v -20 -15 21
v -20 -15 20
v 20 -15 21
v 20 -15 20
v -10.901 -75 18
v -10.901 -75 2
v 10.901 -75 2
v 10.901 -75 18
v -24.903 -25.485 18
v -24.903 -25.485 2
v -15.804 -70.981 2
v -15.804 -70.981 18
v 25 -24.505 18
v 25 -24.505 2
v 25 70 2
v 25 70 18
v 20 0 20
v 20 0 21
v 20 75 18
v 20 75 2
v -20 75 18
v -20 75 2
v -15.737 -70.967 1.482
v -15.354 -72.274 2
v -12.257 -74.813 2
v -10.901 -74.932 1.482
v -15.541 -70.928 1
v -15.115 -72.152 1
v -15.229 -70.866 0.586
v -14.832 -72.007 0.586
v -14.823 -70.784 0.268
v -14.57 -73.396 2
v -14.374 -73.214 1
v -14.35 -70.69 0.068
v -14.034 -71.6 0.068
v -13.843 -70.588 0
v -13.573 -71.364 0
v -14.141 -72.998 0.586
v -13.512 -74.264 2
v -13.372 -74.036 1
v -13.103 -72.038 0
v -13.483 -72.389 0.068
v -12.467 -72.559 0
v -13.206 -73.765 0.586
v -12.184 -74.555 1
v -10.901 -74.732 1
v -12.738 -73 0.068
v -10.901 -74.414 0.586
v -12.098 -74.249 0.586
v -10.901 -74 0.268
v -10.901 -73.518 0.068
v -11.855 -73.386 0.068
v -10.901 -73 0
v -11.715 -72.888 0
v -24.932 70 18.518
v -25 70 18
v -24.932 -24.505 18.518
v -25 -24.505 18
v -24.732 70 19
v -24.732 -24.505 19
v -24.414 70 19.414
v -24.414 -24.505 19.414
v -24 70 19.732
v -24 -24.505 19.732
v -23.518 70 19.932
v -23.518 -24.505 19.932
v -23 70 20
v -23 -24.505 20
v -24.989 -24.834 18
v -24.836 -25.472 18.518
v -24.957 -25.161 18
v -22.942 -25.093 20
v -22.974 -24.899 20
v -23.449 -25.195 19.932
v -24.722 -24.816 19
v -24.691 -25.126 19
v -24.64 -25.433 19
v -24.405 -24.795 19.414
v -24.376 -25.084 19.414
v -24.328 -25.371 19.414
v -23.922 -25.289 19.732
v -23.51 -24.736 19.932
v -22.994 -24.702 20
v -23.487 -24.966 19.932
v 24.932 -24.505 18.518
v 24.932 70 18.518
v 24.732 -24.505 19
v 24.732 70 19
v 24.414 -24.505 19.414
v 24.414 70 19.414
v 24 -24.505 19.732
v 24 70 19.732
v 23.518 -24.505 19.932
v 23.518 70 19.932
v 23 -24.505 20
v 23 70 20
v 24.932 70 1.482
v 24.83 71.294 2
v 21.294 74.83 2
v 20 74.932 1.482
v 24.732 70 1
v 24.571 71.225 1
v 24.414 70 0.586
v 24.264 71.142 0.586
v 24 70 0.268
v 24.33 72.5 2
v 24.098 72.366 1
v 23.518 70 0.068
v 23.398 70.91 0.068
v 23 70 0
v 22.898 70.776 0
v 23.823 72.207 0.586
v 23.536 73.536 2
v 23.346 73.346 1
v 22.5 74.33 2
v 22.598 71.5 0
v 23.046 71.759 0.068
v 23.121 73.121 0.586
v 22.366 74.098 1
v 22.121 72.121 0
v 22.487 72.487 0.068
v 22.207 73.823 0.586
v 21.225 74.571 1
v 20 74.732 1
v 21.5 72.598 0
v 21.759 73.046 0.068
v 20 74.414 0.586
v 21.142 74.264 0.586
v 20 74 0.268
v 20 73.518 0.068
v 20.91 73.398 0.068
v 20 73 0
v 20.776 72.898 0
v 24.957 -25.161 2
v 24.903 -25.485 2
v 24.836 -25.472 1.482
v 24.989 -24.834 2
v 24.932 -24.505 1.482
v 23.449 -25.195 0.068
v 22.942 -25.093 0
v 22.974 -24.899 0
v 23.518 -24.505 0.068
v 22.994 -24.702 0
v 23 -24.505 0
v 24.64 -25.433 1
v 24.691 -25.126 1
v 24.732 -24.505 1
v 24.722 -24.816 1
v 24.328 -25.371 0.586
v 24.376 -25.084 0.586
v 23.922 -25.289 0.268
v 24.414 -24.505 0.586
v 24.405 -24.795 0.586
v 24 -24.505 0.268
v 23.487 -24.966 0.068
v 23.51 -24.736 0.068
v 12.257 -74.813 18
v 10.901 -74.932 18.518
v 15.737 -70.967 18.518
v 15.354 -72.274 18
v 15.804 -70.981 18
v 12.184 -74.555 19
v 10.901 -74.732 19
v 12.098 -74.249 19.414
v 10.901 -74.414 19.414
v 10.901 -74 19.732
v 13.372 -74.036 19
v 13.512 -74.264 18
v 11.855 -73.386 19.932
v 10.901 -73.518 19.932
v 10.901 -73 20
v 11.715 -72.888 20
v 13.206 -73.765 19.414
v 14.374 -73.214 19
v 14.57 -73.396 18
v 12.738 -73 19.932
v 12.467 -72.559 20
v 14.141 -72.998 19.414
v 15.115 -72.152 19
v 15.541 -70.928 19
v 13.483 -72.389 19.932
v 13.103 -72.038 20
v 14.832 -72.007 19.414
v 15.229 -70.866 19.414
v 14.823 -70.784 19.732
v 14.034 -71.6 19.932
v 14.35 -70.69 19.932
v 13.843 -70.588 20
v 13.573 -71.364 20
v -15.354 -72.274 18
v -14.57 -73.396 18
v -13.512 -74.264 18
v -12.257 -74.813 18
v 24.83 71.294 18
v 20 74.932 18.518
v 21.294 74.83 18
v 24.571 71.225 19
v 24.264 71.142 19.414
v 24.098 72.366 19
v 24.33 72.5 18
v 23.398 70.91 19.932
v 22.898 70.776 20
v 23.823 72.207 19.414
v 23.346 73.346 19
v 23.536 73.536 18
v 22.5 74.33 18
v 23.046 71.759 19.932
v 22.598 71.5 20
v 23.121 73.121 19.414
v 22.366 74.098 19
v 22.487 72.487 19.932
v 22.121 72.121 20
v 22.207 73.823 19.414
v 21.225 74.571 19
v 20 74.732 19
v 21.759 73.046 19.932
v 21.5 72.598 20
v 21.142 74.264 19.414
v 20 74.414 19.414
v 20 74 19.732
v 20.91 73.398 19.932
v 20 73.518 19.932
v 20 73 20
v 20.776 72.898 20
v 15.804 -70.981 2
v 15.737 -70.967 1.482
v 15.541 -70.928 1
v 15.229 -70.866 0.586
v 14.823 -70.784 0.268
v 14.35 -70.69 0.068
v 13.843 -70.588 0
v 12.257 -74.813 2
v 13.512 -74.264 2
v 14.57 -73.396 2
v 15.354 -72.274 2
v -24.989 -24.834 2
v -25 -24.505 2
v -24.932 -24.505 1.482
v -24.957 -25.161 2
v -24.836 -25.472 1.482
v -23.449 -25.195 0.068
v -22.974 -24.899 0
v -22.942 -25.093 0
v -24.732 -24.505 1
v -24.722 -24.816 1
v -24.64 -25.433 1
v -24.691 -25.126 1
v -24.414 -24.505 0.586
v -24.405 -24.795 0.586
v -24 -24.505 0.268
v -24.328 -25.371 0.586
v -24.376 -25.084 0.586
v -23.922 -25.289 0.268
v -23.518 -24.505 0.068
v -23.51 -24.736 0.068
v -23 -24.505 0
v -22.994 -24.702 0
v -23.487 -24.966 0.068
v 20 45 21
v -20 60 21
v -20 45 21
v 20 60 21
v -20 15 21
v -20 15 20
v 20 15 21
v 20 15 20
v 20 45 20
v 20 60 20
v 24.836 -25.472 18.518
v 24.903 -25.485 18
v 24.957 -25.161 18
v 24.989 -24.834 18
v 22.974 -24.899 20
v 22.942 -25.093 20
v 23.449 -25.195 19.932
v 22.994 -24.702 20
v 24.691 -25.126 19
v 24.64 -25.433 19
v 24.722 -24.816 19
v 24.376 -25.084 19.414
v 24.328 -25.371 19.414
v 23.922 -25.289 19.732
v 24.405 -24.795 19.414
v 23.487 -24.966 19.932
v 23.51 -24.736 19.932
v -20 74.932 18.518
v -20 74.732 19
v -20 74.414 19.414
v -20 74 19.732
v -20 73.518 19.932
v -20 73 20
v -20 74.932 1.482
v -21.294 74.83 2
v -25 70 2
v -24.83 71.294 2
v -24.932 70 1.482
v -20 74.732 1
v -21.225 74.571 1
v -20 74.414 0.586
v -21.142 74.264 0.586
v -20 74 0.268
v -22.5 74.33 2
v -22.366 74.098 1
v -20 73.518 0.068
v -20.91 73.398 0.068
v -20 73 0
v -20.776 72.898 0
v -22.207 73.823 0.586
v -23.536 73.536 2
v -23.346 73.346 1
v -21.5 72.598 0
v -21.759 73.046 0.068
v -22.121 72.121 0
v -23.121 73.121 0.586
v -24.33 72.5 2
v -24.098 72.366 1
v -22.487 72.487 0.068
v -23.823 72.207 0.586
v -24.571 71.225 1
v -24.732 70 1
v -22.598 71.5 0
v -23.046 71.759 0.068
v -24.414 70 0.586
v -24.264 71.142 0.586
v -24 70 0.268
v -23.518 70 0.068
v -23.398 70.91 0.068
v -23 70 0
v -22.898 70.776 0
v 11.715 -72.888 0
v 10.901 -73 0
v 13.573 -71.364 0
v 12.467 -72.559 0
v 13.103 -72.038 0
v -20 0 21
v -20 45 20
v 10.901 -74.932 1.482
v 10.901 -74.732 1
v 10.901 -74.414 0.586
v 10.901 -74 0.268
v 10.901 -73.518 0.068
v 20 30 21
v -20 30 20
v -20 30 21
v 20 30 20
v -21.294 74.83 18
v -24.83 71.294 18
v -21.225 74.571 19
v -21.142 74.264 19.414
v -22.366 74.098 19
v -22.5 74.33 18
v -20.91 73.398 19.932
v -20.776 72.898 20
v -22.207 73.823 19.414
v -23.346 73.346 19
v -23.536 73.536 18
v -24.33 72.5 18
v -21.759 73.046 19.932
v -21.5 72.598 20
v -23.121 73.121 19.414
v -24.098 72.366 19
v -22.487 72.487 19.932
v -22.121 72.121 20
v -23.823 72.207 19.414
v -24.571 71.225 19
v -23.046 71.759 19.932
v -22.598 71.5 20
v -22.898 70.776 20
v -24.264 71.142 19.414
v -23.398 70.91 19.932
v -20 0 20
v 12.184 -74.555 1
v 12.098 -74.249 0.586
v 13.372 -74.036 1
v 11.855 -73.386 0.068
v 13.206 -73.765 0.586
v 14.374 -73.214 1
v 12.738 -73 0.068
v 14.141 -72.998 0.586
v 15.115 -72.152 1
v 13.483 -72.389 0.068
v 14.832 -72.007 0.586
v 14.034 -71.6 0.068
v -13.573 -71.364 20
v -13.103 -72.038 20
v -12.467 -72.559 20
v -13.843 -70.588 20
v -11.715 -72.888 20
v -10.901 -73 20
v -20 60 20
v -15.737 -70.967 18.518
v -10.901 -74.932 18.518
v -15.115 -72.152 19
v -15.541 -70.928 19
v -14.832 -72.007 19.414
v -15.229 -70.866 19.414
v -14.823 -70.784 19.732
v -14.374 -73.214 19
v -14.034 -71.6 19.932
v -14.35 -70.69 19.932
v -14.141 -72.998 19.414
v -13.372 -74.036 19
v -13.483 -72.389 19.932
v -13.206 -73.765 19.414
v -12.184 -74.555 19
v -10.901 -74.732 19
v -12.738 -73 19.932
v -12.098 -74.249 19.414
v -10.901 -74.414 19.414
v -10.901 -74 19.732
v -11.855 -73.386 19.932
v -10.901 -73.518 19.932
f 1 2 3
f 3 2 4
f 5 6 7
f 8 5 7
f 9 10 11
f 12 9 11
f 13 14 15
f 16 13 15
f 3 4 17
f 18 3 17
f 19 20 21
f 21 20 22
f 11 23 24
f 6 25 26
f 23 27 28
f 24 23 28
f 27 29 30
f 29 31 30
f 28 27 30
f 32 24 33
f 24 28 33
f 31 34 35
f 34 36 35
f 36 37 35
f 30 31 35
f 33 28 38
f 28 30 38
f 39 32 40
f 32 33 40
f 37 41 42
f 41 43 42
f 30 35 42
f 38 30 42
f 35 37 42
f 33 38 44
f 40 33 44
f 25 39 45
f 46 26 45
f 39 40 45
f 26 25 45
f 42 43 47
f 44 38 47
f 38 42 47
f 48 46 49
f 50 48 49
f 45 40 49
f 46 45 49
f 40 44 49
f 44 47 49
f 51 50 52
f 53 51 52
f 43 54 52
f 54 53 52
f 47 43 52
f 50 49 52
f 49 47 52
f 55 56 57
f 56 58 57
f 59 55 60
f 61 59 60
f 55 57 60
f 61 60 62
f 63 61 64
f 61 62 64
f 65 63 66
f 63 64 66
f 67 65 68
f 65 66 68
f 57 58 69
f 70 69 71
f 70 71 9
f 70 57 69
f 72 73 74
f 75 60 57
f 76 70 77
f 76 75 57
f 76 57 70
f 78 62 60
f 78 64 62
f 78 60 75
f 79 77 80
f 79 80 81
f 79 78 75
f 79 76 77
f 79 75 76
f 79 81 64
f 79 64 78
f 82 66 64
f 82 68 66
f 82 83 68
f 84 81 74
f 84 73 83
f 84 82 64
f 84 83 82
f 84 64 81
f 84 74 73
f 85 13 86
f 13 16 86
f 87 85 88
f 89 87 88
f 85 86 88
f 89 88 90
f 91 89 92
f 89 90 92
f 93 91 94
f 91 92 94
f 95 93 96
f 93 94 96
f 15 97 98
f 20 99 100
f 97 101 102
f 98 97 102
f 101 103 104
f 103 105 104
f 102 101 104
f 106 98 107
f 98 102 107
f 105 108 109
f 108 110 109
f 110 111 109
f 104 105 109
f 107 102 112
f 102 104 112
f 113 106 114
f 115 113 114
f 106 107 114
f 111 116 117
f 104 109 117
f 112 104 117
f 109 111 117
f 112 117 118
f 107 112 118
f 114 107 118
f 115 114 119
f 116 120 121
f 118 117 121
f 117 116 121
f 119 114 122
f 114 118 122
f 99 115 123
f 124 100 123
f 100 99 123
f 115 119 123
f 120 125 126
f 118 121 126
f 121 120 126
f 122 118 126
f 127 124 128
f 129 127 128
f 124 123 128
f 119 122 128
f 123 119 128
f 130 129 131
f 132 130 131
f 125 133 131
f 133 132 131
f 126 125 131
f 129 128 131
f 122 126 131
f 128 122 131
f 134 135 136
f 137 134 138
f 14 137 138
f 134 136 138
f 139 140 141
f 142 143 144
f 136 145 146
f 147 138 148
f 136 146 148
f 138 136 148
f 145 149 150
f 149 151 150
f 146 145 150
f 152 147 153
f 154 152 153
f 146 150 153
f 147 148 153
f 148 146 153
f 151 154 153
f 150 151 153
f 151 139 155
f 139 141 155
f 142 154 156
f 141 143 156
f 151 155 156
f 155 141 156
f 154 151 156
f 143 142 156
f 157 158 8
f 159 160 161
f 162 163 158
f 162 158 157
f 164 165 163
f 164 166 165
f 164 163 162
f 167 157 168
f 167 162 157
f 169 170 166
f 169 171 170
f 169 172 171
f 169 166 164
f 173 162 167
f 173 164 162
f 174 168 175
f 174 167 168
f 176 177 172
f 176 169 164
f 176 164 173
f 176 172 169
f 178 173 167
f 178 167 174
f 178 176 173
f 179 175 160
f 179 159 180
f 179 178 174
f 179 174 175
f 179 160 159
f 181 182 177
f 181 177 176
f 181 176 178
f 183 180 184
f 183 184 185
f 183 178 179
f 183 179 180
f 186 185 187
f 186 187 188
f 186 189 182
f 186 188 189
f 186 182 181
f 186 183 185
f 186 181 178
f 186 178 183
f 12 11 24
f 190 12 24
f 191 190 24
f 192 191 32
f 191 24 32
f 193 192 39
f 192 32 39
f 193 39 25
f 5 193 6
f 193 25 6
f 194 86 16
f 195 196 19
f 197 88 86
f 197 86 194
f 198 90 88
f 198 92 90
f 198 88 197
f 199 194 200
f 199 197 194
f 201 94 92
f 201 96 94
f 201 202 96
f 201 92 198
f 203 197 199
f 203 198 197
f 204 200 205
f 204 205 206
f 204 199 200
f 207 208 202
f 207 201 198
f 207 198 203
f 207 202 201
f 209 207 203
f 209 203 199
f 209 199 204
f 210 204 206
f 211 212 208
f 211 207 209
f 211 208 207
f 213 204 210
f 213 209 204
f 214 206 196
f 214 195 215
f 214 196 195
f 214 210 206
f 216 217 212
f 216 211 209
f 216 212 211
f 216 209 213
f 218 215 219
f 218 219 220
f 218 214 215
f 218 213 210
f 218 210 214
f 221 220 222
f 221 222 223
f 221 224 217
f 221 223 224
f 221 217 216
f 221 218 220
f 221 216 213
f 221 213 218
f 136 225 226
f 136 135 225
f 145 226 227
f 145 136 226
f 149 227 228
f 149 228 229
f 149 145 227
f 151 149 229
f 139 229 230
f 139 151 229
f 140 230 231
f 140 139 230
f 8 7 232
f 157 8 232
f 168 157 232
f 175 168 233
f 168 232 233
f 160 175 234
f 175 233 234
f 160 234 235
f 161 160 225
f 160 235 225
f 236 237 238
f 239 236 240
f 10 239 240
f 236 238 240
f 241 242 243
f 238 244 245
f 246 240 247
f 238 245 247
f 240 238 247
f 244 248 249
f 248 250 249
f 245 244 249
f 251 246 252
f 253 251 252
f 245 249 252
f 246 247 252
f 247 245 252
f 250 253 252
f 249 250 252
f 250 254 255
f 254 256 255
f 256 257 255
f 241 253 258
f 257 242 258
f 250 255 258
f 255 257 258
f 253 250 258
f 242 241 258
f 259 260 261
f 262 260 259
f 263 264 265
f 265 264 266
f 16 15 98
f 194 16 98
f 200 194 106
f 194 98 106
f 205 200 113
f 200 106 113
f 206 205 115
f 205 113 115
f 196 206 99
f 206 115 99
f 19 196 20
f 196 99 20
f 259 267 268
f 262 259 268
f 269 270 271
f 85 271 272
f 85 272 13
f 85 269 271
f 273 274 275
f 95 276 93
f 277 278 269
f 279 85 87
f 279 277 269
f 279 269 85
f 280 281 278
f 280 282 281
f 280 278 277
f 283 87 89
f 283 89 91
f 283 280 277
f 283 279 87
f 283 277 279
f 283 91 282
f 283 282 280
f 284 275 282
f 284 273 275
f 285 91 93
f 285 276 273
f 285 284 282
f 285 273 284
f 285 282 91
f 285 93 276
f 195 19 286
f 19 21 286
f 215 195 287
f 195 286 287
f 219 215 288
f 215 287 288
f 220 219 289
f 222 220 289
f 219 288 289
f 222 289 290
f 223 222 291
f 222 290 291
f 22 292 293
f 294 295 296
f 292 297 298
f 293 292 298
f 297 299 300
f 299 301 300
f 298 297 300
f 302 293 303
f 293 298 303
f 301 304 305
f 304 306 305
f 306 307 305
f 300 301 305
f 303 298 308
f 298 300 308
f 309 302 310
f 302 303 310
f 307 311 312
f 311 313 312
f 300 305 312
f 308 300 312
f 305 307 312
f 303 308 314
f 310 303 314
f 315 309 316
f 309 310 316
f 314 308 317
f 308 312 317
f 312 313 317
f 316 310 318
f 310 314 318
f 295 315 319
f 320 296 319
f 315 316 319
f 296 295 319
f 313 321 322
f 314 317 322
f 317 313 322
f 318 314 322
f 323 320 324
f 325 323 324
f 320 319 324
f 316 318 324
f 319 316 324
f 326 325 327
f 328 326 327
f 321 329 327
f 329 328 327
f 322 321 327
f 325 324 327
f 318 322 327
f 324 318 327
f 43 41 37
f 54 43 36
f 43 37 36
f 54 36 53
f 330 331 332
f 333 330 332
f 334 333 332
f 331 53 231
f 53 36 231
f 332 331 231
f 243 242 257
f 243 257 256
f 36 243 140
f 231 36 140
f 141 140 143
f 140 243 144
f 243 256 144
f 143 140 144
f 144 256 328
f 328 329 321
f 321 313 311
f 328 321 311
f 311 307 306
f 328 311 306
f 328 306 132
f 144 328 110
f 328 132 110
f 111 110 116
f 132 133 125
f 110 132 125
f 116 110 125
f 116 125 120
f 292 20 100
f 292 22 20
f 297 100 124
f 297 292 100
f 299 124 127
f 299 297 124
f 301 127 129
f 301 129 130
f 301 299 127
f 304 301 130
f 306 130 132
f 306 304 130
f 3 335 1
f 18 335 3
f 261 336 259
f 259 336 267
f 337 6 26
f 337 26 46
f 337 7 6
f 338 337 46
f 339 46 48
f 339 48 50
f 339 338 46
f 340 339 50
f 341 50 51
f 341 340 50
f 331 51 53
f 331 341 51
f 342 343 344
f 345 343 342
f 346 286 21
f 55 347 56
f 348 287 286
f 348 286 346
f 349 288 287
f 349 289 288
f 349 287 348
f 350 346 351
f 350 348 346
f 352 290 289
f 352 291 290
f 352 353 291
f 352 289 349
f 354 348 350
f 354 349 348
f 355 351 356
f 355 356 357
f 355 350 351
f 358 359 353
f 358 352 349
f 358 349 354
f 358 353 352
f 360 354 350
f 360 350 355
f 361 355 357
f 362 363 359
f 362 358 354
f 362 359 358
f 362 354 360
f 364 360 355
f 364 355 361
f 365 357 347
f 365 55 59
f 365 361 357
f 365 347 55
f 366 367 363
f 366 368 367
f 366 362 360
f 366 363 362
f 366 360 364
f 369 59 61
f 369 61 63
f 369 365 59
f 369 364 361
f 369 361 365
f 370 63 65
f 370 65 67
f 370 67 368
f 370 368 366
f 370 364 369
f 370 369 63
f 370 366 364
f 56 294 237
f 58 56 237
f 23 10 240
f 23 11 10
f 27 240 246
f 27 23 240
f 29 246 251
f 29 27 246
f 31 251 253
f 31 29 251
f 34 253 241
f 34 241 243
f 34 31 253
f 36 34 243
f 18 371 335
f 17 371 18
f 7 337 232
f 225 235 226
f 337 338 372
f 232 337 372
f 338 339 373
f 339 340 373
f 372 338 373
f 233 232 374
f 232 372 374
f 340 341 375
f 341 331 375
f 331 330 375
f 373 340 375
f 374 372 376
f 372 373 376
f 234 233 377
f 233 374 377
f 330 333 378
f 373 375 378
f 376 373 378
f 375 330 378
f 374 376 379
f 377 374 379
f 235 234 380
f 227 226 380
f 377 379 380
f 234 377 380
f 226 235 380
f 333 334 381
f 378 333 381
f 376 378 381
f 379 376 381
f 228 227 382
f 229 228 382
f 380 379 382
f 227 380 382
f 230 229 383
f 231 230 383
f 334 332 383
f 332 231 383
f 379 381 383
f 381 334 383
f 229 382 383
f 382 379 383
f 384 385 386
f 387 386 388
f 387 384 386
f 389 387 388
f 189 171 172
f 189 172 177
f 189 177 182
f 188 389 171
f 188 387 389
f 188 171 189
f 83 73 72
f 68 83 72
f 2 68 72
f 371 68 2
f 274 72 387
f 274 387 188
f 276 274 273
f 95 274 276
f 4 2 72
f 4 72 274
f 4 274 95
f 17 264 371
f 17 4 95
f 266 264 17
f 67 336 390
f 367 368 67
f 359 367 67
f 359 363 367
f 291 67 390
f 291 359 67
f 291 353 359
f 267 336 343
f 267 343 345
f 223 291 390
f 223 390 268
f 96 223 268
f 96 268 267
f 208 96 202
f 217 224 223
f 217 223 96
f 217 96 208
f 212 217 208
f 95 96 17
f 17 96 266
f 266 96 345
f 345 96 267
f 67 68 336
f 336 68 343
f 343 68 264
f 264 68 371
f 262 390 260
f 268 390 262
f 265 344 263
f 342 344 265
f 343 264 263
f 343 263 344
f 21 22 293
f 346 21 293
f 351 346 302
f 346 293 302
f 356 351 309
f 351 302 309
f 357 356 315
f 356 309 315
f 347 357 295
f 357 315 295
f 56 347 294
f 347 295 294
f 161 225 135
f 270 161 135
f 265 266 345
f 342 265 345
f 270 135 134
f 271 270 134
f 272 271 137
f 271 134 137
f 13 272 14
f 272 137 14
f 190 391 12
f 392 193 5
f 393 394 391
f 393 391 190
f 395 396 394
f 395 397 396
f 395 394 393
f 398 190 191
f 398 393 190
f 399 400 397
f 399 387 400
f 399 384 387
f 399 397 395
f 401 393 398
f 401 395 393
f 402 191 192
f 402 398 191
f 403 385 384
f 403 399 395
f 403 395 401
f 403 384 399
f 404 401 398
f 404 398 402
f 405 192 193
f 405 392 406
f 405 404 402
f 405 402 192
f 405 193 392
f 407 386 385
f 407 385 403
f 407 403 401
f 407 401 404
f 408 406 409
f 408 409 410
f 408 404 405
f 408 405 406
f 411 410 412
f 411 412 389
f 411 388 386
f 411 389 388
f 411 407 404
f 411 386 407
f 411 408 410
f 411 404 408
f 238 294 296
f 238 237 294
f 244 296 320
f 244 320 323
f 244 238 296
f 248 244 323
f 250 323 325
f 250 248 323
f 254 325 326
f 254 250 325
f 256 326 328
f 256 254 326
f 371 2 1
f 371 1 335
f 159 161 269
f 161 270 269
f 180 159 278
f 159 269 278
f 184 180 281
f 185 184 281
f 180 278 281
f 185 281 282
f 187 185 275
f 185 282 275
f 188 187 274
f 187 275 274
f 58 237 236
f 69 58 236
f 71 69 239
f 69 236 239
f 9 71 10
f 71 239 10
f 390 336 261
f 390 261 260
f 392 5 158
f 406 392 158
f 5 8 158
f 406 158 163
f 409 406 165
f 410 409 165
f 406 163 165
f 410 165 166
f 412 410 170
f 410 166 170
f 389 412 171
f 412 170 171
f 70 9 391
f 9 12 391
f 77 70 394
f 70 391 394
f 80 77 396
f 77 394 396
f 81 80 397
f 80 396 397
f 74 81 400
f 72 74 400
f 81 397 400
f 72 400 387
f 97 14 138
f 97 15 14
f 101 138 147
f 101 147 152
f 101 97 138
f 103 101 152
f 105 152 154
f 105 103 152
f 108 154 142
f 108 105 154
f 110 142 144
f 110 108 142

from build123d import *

# Parameters (mm, degrees)
F1_DEPTH = 20
F2_R     = 2
F3_W     = 40
F3_H     = 15
F4_DEPTH = 1


with BuildPart() as f1:
    # F0 (on Top) → F1 (new body)
    with BuildSketch(Plane.XY):
        with BuildLine():
            Line((20, 75), (-20, 75))
            ThreePointArc((-20, 75), (-23.535534, 73.535534), (-25, 70))
            Line((-25, 70), (-25, -24.504902))
            ThreePointArc((-25, -24.504902), (-24.975667, -24.997591), (-24.902903, -25.485483))
            Line((-24.902903, -25.485483), (-15.803884, -70.980581))
            ThreePointArc((-15.803884, -70.980581), (-14.070925, -73.866711), (-10.90098, -75))
            Line((-10.90098, -75), (10.90098, -75))
            ThreePointArc((10.90098, -75), (14.070925, -73.866711), (15.803884, -70.980581))
            Line((15.803884, -70.980581), (24.902903, -25.485483))
            ThreePointArc((24.902903, -25.485483), (24.975667, -24.997591), (25, -24.504902))
            Line((25, -24.504902), (25, 70))
            ThreePointArc((25, 70), (23.535534, 73.535534), (20, 75))
        make_face()
    extrude(amount=F1_DEPTH)

    # F2
    f2_edges = [f1.edges().sort_by_distance(p)[0] for p in [
        (-25, 22.747549, 20),
        (-20.353394, -48.233032, 0),
    ]]
    fillet(f2_edges, radius=F2_R)

    # F3 (on face) → F4 (join)
    with BuildSketch(Plane.XY.offset(20)):
        with Locations((0, 52.5)):
            Rectangle(F3_W, F3_H)
        with Locations((0, 22.5)):
            Rectangle(F3_W, F3_H)
        with Locations((0, -7.5)):
            Rectangle(F3_W, F3_H)
    extrude(amount=F4_DEPTH)


solid = f1.part
